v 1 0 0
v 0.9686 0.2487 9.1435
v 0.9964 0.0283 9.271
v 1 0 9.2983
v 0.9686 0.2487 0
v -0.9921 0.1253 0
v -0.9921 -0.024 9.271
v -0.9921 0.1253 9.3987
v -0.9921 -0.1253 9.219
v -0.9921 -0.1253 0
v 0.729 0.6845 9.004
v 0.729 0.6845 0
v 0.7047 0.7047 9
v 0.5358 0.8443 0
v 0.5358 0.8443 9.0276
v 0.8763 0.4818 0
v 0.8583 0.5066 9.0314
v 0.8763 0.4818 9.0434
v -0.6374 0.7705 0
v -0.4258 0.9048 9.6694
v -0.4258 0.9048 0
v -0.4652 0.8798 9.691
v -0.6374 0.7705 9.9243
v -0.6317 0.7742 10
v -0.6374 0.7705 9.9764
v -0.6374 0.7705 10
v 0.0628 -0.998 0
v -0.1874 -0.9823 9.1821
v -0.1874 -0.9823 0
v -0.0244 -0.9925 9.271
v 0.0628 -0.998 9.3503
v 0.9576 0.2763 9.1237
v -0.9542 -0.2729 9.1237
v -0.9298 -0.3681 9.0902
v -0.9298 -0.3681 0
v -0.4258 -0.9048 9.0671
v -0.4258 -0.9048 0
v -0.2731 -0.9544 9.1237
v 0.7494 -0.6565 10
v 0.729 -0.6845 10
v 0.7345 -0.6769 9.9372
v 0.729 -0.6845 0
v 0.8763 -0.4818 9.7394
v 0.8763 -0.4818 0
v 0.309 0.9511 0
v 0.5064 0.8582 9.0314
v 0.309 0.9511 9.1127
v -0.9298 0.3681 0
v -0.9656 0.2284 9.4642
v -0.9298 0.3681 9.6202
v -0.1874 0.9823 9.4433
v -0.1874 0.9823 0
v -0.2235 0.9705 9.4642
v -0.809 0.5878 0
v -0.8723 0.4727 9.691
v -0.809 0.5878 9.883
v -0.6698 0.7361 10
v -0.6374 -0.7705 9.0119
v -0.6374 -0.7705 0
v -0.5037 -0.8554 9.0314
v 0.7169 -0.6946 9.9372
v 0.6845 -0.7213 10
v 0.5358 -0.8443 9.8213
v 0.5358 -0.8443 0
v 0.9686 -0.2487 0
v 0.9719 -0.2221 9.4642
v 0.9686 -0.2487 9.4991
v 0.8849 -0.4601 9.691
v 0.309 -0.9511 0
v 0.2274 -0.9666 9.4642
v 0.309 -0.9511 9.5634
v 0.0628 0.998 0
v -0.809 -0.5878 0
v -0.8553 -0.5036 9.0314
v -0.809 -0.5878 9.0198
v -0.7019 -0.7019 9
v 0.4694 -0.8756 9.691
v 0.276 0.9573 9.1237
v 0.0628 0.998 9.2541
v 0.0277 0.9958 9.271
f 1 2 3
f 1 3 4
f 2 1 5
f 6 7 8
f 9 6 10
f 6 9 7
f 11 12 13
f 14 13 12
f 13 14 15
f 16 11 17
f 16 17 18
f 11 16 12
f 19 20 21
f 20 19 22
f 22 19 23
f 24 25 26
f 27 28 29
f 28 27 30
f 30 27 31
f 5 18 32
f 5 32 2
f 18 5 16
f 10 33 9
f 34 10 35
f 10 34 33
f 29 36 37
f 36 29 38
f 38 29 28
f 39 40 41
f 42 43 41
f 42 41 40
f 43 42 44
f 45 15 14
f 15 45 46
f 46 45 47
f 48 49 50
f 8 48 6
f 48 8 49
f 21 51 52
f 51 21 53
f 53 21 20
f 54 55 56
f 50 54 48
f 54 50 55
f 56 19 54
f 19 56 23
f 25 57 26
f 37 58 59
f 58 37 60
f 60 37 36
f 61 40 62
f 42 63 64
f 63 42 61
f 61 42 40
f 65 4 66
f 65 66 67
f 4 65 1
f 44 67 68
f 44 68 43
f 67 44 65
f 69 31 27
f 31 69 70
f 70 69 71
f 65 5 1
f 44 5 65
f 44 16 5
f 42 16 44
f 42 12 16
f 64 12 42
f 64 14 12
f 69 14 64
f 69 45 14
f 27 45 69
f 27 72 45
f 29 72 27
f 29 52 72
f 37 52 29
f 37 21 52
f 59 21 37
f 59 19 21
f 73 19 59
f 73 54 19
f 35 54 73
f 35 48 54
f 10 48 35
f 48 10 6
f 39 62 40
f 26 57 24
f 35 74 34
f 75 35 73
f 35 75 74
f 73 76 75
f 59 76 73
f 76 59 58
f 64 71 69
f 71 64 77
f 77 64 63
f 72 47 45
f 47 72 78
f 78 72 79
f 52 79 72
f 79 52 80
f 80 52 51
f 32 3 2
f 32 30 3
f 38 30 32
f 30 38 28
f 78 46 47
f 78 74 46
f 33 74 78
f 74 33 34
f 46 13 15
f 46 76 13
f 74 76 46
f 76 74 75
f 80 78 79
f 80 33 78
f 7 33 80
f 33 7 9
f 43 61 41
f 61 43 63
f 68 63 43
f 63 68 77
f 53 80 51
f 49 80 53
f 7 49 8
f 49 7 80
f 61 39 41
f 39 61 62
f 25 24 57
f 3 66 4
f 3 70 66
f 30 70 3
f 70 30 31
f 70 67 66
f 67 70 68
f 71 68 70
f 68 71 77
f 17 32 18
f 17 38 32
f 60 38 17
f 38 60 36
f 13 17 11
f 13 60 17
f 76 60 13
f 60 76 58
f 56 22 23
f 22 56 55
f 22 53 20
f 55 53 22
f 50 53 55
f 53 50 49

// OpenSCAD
module support(h,r=1,dir=0,slope=90,$fn=$fn) {
    difference(){
        cylinder(h,r=r);
        translate([0,0,h])
        rotate([0,slope,dir])
        cylinder(h,r=r,center=true);
    }
}

support(10,1,dir=45,$fn=25);
